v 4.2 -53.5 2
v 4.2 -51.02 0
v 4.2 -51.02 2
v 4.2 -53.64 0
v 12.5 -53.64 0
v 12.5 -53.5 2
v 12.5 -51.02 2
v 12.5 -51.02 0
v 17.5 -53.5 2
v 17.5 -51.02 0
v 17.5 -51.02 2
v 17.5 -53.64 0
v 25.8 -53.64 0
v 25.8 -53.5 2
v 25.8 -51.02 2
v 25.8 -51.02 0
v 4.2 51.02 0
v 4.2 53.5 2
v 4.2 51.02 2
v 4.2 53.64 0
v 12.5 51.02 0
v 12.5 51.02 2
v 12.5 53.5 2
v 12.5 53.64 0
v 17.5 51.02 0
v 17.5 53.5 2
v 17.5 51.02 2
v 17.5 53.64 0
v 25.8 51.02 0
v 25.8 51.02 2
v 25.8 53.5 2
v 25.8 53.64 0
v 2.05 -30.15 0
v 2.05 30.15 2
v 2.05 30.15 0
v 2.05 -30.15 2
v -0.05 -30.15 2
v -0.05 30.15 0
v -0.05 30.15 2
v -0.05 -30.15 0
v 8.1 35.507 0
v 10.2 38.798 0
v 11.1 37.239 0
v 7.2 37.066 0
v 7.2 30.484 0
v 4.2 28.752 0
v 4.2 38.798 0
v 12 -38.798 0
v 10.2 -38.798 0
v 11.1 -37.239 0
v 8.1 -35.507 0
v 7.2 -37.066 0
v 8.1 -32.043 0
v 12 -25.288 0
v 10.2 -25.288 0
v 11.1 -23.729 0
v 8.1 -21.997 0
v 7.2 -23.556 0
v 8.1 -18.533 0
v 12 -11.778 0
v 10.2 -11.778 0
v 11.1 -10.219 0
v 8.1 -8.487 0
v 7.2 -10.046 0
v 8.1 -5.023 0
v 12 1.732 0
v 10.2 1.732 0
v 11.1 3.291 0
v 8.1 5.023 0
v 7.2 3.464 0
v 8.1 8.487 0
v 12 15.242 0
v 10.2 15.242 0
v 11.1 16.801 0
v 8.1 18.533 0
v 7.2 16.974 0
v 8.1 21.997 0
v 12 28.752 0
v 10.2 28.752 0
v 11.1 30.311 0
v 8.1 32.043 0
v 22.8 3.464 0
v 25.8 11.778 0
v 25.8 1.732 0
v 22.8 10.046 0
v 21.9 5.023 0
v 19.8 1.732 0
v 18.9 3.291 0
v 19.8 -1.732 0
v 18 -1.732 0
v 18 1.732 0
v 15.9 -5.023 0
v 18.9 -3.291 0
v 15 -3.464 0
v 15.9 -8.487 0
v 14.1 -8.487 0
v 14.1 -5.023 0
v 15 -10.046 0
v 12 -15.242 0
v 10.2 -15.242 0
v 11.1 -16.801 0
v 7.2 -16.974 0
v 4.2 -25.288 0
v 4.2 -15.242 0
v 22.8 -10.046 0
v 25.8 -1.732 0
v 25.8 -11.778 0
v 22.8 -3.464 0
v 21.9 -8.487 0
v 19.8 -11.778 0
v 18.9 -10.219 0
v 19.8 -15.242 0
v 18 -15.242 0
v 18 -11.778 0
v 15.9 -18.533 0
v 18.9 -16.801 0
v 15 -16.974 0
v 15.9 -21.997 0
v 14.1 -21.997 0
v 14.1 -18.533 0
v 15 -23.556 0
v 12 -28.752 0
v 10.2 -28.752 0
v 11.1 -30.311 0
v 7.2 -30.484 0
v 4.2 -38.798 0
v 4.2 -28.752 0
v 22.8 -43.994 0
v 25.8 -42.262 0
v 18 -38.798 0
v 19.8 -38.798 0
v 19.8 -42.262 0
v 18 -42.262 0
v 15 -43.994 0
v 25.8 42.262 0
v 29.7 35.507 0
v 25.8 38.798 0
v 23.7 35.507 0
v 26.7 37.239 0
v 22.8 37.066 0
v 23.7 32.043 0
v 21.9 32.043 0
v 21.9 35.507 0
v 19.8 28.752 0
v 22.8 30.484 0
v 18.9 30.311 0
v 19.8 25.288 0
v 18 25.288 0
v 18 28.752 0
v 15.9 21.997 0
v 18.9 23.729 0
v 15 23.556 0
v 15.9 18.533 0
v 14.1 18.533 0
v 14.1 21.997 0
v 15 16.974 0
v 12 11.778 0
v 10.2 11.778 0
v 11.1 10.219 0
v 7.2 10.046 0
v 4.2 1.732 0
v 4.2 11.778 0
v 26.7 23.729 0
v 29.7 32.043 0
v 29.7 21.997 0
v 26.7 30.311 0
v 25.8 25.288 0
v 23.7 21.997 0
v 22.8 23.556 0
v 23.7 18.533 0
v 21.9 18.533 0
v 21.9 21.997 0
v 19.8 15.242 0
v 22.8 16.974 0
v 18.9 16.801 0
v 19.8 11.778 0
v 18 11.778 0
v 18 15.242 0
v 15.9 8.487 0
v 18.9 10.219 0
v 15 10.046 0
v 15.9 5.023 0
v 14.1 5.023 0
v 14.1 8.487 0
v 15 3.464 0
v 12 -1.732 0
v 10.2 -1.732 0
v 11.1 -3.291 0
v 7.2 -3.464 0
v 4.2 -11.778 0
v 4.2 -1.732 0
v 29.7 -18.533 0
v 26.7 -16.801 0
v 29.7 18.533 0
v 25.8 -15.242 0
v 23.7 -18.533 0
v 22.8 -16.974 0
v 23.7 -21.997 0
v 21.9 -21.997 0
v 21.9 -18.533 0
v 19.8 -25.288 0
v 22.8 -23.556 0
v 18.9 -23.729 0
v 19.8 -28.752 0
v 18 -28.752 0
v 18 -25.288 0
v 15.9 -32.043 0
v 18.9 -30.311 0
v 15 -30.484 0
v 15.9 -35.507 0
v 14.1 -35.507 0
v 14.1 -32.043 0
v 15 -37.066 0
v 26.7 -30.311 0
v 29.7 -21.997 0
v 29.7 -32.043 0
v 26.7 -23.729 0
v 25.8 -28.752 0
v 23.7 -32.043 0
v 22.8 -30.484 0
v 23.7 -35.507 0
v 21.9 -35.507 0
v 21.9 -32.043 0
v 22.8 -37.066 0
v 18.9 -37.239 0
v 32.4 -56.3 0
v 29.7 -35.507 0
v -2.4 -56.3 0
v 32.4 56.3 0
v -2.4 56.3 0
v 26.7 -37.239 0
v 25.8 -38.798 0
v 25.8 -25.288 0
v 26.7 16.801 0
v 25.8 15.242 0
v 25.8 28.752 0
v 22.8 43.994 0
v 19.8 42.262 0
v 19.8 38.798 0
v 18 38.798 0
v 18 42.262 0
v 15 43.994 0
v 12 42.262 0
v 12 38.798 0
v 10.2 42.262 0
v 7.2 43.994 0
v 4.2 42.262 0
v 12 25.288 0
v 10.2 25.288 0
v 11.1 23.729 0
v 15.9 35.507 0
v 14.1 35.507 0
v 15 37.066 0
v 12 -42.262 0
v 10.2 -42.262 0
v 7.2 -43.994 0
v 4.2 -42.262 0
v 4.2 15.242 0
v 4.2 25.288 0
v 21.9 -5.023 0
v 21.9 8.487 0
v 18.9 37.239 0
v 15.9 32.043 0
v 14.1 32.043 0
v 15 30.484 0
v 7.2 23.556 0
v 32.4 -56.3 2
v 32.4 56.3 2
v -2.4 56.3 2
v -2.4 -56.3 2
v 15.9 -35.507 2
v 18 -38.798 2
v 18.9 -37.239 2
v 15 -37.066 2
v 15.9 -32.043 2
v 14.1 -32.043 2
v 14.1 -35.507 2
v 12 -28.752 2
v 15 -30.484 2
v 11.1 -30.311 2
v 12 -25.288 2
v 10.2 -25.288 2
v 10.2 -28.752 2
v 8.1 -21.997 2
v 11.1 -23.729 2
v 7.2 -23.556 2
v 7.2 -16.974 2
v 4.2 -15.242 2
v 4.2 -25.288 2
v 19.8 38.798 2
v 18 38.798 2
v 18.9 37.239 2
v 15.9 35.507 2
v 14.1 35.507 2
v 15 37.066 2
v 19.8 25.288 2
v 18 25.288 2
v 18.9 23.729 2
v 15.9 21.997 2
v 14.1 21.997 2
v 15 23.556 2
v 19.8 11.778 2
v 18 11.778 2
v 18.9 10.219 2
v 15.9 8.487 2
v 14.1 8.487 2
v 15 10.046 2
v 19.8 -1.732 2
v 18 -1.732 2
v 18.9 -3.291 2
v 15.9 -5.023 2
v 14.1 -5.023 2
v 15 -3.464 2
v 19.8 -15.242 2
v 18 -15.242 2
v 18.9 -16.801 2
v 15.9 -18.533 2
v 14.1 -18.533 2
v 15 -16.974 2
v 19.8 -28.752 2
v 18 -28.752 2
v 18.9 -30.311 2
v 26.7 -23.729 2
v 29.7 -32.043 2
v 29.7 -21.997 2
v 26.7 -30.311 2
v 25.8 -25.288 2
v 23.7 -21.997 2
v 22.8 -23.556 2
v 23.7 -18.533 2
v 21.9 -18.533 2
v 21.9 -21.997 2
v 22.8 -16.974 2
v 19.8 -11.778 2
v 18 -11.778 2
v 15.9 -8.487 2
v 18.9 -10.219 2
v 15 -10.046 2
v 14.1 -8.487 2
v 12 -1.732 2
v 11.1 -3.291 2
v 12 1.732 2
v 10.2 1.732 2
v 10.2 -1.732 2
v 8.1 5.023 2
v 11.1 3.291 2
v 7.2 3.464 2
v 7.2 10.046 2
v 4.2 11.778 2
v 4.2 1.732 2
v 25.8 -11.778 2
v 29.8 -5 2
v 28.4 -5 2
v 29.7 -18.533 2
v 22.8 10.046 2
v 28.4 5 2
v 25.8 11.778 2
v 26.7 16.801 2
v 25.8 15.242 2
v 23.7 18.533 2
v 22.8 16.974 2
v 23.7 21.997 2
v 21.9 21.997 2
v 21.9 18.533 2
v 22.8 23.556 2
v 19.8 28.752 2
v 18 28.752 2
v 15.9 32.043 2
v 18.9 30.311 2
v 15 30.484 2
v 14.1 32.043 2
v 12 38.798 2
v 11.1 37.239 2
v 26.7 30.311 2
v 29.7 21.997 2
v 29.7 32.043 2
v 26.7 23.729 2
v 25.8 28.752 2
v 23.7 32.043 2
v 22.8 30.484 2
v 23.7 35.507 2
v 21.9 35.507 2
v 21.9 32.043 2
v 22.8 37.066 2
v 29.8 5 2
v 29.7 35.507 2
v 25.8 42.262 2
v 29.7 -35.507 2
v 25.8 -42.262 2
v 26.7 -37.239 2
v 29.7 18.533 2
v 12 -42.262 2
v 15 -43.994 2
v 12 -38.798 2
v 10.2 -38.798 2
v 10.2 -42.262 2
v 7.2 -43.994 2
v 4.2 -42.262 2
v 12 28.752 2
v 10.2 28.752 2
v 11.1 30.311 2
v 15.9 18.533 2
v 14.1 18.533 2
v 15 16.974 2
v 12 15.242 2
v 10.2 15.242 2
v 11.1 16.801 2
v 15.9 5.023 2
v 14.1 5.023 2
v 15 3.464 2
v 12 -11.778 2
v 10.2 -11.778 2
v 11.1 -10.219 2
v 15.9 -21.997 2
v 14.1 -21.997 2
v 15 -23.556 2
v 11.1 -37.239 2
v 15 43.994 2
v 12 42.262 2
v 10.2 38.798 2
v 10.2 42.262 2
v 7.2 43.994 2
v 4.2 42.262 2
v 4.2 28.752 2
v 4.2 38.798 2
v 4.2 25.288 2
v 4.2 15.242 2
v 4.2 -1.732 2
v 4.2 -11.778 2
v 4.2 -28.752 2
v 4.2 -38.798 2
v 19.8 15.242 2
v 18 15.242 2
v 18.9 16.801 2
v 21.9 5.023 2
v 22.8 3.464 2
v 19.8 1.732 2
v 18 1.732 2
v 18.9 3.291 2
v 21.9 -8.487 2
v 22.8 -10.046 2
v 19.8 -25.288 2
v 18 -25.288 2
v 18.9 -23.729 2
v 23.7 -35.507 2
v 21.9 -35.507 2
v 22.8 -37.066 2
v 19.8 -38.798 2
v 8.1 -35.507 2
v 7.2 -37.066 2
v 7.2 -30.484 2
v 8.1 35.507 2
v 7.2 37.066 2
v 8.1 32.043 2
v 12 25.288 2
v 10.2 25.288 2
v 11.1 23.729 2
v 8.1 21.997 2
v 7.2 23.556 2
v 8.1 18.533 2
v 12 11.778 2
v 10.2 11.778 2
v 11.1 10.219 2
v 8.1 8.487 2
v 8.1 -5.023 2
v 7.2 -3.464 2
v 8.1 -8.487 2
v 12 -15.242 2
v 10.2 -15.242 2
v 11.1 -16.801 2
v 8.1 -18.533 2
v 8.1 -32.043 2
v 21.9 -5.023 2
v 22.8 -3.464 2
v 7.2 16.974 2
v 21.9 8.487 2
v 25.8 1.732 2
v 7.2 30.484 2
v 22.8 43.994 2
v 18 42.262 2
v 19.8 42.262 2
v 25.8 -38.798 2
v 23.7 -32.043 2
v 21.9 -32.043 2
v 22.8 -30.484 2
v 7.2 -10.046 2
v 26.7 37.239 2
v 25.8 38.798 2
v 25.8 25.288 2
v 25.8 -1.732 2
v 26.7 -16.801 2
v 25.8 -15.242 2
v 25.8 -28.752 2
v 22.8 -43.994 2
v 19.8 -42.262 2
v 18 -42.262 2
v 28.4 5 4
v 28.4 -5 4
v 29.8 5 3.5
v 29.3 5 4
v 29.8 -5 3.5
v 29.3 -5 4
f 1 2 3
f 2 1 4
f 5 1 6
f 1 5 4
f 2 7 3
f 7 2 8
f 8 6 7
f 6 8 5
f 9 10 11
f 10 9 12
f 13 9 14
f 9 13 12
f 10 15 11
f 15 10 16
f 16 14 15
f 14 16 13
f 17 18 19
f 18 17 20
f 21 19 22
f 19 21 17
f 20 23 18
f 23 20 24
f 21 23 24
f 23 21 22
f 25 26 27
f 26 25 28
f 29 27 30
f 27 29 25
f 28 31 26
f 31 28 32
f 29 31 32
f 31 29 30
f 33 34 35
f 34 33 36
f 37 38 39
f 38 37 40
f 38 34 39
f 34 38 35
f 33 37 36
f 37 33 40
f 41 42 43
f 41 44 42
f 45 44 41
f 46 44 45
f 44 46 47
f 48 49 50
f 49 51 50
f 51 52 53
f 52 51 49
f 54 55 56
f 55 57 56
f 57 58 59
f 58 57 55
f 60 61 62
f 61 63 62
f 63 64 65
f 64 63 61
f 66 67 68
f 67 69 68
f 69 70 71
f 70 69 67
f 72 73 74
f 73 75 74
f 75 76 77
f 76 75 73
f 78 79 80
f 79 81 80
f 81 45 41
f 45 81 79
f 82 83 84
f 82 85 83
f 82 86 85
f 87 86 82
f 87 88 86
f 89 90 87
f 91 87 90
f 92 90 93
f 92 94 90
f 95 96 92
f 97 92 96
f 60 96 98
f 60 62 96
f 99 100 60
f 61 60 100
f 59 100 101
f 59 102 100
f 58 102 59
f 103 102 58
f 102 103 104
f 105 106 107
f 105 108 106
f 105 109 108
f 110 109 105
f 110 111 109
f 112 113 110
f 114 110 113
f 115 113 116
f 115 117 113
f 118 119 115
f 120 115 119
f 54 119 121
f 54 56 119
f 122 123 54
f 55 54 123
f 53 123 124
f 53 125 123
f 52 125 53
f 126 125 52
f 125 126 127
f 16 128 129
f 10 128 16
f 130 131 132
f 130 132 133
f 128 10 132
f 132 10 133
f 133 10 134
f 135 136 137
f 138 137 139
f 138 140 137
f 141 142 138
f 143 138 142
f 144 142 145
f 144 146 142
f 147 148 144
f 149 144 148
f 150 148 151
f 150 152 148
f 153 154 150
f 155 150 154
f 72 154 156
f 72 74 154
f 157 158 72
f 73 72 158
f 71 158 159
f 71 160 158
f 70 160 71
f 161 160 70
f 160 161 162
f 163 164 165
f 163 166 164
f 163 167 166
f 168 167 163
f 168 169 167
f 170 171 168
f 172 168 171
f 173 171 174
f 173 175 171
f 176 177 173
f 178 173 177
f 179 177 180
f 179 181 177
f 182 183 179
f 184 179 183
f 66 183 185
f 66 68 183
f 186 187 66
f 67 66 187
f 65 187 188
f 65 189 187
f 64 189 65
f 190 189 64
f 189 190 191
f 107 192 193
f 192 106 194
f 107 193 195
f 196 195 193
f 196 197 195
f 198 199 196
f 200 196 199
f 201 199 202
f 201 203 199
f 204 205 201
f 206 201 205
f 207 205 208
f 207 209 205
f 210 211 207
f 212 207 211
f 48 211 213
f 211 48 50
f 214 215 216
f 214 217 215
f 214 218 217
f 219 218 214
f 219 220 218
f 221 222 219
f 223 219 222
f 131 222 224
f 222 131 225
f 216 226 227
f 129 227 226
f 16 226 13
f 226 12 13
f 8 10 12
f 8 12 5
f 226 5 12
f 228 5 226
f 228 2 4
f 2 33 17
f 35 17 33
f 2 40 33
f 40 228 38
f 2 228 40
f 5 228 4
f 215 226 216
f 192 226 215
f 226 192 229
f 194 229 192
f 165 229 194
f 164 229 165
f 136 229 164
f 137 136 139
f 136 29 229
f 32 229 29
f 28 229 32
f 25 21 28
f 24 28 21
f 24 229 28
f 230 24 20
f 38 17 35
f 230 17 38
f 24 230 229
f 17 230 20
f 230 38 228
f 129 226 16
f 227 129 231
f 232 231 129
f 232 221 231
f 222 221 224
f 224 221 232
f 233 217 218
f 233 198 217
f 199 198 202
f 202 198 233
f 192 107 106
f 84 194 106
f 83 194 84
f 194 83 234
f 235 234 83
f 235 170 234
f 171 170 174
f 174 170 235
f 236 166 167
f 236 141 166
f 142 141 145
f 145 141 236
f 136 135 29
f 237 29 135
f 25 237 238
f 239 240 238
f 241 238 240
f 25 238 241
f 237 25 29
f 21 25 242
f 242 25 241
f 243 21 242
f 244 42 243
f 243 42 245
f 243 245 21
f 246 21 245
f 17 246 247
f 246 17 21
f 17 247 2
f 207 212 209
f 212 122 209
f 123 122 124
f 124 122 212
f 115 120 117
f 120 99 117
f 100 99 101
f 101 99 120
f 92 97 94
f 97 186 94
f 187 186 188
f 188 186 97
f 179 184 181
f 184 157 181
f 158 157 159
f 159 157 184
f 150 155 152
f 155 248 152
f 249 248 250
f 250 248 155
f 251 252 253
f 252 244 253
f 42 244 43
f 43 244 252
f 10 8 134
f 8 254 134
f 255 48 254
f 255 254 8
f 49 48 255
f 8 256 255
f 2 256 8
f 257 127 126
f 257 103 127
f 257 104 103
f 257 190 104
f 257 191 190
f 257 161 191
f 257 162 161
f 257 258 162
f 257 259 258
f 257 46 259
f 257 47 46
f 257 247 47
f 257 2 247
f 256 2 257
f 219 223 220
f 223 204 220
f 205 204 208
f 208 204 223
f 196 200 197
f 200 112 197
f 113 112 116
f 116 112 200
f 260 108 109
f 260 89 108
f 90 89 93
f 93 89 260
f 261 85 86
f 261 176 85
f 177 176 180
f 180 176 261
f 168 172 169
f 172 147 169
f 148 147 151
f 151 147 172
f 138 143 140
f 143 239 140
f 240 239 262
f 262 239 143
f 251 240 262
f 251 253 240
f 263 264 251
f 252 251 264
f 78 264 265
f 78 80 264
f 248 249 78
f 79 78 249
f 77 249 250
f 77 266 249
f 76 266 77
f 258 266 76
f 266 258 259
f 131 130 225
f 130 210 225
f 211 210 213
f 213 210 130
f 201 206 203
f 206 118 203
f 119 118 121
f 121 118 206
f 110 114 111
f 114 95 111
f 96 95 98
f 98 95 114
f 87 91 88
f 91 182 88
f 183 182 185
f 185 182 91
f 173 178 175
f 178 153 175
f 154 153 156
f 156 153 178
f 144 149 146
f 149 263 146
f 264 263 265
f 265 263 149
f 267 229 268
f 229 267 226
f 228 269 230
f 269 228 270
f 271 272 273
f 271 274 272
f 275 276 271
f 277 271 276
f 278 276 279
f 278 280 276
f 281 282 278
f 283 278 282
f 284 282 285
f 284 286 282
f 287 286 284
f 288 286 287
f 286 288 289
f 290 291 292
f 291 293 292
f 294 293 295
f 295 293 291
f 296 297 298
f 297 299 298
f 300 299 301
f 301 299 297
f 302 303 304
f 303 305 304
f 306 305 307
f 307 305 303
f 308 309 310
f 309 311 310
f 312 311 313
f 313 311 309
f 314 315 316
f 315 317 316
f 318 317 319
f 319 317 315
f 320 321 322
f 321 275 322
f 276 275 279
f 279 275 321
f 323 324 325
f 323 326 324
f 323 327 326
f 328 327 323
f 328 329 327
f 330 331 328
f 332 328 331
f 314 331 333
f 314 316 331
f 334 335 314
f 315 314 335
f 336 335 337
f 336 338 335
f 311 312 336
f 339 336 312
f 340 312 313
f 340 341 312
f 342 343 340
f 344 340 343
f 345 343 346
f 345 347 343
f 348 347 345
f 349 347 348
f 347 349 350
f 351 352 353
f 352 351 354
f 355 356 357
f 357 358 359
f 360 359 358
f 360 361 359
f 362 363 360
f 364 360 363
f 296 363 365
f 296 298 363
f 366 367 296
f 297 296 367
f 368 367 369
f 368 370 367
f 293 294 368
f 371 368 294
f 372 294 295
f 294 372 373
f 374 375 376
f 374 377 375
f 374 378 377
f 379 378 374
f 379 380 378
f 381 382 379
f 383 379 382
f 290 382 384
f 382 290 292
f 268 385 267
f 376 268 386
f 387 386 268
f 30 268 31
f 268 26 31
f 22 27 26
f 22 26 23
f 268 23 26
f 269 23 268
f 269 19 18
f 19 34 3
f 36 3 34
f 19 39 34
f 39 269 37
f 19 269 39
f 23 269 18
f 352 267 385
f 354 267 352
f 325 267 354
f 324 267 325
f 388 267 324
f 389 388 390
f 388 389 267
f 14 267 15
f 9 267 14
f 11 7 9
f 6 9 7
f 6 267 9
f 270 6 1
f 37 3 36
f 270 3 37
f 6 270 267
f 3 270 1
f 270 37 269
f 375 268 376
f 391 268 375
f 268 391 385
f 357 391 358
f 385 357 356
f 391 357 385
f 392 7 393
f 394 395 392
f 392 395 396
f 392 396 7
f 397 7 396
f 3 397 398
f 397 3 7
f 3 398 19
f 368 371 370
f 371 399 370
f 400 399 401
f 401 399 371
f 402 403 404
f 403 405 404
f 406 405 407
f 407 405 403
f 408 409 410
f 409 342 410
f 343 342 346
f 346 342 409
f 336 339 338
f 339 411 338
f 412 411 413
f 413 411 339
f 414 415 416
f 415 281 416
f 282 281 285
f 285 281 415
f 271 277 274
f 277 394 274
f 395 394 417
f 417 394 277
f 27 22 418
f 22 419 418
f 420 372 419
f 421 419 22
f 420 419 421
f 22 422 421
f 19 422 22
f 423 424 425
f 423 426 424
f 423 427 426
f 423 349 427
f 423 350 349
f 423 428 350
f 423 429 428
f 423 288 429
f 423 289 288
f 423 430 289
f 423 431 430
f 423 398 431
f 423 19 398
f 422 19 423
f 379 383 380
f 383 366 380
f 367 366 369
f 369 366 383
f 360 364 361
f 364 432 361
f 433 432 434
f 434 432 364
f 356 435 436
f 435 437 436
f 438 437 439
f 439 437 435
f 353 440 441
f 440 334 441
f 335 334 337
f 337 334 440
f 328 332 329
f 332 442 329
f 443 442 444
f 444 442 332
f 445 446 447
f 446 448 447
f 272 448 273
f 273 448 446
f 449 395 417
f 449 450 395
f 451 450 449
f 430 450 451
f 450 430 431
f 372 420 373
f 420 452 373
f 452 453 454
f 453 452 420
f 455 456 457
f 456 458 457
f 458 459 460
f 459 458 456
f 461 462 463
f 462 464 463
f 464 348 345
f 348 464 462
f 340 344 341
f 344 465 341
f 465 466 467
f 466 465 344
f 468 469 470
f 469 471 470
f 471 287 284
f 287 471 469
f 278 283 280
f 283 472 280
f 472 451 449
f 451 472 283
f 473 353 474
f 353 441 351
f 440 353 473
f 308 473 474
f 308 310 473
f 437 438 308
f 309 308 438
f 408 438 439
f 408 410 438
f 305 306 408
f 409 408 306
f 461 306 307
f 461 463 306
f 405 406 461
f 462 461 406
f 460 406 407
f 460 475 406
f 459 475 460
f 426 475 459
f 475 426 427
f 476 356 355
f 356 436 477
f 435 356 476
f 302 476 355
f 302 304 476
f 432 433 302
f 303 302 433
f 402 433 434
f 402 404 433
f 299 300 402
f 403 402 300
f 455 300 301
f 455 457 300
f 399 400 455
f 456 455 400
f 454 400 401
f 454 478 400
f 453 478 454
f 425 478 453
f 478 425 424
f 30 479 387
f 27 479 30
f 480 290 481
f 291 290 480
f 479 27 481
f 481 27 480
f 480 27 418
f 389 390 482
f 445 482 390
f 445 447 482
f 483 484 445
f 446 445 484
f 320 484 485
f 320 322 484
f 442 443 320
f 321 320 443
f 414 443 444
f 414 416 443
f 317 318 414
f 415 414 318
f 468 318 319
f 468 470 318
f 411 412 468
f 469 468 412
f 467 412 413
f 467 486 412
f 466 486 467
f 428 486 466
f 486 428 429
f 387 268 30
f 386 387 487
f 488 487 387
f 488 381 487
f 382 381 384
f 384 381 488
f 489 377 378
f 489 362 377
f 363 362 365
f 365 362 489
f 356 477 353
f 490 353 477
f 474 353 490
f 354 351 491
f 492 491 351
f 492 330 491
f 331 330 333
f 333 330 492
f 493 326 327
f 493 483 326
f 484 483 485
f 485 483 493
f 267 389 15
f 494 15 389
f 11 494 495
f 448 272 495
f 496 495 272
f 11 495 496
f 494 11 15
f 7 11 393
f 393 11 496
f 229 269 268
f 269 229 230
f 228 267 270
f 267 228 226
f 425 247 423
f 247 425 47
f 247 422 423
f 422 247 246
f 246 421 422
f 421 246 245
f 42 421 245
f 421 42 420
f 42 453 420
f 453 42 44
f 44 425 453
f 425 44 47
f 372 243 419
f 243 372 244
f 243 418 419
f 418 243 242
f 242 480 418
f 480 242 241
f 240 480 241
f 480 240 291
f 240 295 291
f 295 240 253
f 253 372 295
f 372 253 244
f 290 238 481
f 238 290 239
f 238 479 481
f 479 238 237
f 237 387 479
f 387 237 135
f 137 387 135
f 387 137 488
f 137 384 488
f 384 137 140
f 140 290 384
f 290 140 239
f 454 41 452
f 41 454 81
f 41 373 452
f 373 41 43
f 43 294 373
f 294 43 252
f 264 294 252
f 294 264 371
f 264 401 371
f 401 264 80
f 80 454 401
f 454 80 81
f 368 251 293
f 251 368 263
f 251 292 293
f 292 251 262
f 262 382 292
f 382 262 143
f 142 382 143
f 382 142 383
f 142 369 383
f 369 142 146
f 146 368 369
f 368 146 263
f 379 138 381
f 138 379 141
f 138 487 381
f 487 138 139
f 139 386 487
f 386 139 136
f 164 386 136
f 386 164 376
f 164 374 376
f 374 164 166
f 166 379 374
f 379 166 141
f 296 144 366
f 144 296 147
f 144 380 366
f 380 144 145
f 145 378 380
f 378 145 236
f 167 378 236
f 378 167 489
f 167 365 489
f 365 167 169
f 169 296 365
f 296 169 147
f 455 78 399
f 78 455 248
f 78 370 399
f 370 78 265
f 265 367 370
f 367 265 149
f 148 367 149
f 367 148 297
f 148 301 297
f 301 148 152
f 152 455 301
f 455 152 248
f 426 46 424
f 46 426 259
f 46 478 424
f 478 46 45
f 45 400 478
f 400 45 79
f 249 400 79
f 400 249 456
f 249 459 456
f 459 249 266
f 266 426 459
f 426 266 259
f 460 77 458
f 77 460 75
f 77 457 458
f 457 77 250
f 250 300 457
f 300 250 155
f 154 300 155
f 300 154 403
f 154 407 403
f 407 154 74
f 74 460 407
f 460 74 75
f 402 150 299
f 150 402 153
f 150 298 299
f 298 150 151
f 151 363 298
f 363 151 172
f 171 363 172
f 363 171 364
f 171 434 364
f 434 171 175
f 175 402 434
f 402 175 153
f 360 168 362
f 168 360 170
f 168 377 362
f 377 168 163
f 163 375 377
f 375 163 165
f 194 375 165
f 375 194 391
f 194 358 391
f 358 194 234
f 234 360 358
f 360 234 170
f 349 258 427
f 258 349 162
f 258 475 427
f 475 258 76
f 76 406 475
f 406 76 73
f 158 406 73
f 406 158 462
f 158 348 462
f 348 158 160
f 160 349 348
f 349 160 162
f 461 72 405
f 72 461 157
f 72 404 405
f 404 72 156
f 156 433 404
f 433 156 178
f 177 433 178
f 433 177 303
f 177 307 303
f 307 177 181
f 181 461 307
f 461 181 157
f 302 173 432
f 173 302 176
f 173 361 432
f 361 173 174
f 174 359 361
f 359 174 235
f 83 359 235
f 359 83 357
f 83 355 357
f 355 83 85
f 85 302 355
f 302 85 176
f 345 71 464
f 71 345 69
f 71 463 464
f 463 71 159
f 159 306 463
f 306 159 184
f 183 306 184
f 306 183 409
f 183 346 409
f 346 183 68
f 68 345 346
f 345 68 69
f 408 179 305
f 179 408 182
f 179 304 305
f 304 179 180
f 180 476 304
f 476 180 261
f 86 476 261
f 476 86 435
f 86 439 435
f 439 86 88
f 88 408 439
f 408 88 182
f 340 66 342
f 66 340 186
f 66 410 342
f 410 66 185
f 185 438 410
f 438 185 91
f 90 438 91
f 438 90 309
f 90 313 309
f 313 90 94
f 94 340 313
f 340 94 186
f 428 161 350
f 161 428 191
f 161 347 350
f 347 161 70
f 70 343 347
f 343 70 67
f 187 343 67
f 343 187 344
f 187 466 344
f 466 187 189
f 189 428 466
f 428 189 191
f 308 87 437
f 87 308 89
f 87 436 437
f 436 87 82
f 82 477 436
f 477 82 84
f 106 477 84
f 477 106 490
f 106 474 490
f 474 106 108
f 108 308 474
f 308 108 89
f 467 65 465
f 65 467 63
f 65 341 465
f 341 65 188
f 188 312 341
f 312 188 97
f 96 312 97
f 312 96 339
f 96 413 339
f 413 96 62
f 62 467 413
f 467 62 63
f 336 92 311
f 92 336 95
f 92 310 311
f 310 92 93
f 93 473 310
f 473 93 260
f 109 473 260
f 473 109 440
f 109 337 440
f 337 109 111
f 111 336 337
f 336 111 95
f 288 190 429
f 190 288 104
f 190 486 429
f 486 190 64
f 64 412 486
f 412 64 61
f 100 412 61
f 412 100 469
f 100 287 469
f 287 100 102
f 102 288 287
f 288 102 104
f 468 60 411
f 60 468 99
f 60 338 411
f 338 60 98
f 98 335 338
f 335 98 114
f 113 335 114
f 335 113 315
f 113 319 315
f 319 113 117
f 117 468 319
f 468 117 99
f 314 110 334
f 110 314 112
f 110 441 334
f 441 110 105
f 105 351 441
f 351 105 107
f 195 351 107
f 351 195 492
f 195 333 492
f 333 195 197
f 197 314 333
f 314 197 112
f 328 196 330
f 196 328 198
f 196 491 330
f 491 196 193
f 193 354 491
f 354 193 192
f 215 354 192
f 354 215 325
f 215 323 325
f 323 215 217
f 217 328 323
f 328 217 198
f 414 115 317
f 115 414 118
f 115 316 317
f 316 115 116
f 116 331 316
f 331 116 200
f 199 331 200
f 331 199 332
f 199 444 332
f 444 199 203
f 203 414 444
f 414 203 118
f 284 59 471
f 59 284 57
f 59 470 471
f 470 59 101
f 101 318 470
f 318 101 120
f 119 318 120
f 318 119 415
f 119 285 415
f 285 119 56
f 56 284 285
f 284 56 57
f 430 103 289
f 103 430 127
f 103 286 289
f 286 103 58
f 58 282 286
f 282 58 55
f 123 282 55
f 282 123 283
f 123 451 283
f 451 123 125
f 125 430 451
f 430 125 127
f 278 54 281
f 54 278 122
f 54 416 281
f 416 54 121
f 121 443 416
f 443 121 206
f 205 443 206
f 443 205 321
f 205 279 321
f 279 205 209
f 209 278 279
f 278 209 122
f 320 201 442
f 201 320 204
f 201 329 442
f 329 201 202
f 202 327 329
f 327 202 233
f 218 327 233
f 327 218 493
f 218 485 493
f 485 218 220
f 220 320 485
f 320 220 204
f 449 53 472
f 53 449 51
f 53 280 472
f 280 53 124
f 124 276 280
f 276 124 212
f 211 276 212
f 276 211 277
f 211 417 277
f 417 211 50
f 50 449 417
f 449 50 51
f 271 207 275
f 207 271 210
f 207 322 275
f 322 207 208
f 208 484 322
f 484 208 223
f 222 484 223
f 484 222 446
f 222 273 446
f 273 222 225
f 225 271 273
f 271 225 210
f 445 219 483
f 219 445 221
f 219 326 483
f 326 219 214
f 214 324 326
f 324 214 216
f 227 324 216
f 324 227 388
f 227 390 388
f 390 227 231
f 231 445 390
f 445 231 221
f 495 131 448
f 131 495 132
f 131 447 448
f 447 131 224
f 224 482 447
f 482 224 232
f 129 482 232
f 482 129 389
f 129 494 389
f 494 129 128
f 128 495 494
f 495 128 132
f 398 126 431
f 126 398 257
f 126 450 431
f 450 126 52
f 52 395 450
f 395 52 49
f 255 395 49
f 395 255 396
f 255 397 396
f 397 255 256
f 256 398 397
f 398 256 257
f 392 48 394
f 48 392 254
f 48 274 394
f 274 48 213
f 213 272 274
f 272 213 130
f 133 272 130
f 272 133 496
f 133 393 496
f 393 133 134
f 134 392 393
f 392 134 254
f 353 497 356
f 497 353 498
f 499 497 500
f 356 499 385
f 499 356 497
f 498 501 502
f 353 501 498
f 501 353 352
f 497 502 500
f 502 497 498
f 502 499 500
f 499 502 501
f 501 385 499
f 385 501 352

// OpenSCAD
// file: lib.scad
// Helpers shared by the parts.
include <params.scad>

// box from corner a to corner b
module box(a, b) {
    translate([min(a[0],b[0]), min(a[1],b[1]), min(a[2],b[2])])
        cube([abs(b[0]-a[0]), abs(b[1]-a[1]), abs(b[2]-a[2])]);
}

// ---- pins ---------------------------------------------------------------
// Pin along +z from z=0: cylinder + conical tip.
module pin() {
    cylinder(d = pin_d, h = pin_len - pin_tip + 0.01);
    translate([0, 0, pin_len - pin_tip])
        cylinder(d1 = pin_d, d2 = 1.0, h = pin_tip);
}

// ---- hex bump --------------------------------------------------------
// Hexagonal bump standing on the XY plane, slight taper for a lead-in.
// Same orientation as the honeycomb cells (rotate(30)), so a plate bump
// drops straight into a cell of the plate above.
module hex_bump(af) {
    r = af / sqrt(3);
    translate([0, 0, -0.3])
        linear_extrude(height = bump_h + 0.3, scale = 0.93) rotate(30) circle(r = r, $fn = 6);
}
module hex_hole(af, t) {
    r = af / sqrt(3);
    translate([0, 0, -1]) linear_extrude(height = t + 2) rotate(30) circle(r = r, $fn = 6);
}
// keep-out rectangle for a hex bump (or hole) in a centred 2D field
function bump_keep(x, y, cx, cy, af = wall_bump_af) = let(r = af / sqrt(3) + b_keep_margin)
    [x - r - cx, y - r - cy, x + r - cx, y + r - cy];

// ---- honeycomb -----------------------------------------------------------
// 2D field of hexagonal holes filling a `size` = [w, h] rectangle centred on
// the origin. Only whole cells are emitted, so the border stays a clean web.
// `keep` lists [x0, y0, x1, y1] rectangles (same frame) no cell may touch,
// or [ox, oy, a, u0, u1, v0, v1]: a rectangle u0..u1 along a direction at
// angle a from x and v0..v1 across it, from (ox, oy), for a keep-out that
// runs on a slant. The cell counts as a circle of its circumradius.
function hits_keep(cx, cy, r, keep) =
    len([for (k = keep) if (len(k) == 4 ? cx + r > k[0] && cx - r < k[2] && cy + r > k[1] && cy - r < k[3]
                                         : hits_slant(cx - k[0], cy - k[1], r, k)) 1]) > 0;
function hits_slant(dx, dy, r, k) = let(u = dx * cos(k[2]) + dy * sin(k[2]), v = -dx * sin(k[2]) + dy * cos(k[2]))
    u + r > k[3] && u - r < k[4] && v + r > k[5] && v - r < k[6];

// `phase` shifts the cell grid so two fields on different parts can share
// one lattice (their cells then line up when assembled).
module hex_holes(size, cell, web, keep = [], phase = [0, 0]) {
    r  = cell / sqrt(3);            // circumradius for across-flats = cell
    dx = cell + web;
    dy = dx * sqrt(3) / 2;
    nx = ceil(size[0] / dx) + 1;
    ny = ceil(size[1] / dy) + 1;
    for (j = [-ny - 1 : ny + 1], i = [-nx - 1 : nx + 1]) {
        cx = i * dx + (j % 2 == 0 ? 0 : dx / 2) + phase[0];
        cy = j * dy + phase[1];
        if (abs(cx) + cell/2 <= size[0]/2 && abs(cy) + r <= size[1]/2
            && !hits_keep(cx, cy, r, keep))
            translate([cx, cy]) rotate(30) circle(r = r, $fn = 6);
    }
}

// Through-cut for a wall: hex field extruded `t` thick, centred on z = 0.
module honeycomb_cut(size, t, cell, web, keep = [], phase = [0, 0]) {
    linear_extrude(height = t, center = true) hex_holes(size, cell, web, keep, phase);
}
// main file
// Caddy bezel (a flat plate, print front face down). Slots take the tray's
// tabs; the tray's pull ledge stands out through the bottom slot.
include <params.scad>
use <caddy.scad>
translate([0, 0, c_body_l + bezel_t]) rotate([0, 90, 0]) bezel();   // front face on the bed
